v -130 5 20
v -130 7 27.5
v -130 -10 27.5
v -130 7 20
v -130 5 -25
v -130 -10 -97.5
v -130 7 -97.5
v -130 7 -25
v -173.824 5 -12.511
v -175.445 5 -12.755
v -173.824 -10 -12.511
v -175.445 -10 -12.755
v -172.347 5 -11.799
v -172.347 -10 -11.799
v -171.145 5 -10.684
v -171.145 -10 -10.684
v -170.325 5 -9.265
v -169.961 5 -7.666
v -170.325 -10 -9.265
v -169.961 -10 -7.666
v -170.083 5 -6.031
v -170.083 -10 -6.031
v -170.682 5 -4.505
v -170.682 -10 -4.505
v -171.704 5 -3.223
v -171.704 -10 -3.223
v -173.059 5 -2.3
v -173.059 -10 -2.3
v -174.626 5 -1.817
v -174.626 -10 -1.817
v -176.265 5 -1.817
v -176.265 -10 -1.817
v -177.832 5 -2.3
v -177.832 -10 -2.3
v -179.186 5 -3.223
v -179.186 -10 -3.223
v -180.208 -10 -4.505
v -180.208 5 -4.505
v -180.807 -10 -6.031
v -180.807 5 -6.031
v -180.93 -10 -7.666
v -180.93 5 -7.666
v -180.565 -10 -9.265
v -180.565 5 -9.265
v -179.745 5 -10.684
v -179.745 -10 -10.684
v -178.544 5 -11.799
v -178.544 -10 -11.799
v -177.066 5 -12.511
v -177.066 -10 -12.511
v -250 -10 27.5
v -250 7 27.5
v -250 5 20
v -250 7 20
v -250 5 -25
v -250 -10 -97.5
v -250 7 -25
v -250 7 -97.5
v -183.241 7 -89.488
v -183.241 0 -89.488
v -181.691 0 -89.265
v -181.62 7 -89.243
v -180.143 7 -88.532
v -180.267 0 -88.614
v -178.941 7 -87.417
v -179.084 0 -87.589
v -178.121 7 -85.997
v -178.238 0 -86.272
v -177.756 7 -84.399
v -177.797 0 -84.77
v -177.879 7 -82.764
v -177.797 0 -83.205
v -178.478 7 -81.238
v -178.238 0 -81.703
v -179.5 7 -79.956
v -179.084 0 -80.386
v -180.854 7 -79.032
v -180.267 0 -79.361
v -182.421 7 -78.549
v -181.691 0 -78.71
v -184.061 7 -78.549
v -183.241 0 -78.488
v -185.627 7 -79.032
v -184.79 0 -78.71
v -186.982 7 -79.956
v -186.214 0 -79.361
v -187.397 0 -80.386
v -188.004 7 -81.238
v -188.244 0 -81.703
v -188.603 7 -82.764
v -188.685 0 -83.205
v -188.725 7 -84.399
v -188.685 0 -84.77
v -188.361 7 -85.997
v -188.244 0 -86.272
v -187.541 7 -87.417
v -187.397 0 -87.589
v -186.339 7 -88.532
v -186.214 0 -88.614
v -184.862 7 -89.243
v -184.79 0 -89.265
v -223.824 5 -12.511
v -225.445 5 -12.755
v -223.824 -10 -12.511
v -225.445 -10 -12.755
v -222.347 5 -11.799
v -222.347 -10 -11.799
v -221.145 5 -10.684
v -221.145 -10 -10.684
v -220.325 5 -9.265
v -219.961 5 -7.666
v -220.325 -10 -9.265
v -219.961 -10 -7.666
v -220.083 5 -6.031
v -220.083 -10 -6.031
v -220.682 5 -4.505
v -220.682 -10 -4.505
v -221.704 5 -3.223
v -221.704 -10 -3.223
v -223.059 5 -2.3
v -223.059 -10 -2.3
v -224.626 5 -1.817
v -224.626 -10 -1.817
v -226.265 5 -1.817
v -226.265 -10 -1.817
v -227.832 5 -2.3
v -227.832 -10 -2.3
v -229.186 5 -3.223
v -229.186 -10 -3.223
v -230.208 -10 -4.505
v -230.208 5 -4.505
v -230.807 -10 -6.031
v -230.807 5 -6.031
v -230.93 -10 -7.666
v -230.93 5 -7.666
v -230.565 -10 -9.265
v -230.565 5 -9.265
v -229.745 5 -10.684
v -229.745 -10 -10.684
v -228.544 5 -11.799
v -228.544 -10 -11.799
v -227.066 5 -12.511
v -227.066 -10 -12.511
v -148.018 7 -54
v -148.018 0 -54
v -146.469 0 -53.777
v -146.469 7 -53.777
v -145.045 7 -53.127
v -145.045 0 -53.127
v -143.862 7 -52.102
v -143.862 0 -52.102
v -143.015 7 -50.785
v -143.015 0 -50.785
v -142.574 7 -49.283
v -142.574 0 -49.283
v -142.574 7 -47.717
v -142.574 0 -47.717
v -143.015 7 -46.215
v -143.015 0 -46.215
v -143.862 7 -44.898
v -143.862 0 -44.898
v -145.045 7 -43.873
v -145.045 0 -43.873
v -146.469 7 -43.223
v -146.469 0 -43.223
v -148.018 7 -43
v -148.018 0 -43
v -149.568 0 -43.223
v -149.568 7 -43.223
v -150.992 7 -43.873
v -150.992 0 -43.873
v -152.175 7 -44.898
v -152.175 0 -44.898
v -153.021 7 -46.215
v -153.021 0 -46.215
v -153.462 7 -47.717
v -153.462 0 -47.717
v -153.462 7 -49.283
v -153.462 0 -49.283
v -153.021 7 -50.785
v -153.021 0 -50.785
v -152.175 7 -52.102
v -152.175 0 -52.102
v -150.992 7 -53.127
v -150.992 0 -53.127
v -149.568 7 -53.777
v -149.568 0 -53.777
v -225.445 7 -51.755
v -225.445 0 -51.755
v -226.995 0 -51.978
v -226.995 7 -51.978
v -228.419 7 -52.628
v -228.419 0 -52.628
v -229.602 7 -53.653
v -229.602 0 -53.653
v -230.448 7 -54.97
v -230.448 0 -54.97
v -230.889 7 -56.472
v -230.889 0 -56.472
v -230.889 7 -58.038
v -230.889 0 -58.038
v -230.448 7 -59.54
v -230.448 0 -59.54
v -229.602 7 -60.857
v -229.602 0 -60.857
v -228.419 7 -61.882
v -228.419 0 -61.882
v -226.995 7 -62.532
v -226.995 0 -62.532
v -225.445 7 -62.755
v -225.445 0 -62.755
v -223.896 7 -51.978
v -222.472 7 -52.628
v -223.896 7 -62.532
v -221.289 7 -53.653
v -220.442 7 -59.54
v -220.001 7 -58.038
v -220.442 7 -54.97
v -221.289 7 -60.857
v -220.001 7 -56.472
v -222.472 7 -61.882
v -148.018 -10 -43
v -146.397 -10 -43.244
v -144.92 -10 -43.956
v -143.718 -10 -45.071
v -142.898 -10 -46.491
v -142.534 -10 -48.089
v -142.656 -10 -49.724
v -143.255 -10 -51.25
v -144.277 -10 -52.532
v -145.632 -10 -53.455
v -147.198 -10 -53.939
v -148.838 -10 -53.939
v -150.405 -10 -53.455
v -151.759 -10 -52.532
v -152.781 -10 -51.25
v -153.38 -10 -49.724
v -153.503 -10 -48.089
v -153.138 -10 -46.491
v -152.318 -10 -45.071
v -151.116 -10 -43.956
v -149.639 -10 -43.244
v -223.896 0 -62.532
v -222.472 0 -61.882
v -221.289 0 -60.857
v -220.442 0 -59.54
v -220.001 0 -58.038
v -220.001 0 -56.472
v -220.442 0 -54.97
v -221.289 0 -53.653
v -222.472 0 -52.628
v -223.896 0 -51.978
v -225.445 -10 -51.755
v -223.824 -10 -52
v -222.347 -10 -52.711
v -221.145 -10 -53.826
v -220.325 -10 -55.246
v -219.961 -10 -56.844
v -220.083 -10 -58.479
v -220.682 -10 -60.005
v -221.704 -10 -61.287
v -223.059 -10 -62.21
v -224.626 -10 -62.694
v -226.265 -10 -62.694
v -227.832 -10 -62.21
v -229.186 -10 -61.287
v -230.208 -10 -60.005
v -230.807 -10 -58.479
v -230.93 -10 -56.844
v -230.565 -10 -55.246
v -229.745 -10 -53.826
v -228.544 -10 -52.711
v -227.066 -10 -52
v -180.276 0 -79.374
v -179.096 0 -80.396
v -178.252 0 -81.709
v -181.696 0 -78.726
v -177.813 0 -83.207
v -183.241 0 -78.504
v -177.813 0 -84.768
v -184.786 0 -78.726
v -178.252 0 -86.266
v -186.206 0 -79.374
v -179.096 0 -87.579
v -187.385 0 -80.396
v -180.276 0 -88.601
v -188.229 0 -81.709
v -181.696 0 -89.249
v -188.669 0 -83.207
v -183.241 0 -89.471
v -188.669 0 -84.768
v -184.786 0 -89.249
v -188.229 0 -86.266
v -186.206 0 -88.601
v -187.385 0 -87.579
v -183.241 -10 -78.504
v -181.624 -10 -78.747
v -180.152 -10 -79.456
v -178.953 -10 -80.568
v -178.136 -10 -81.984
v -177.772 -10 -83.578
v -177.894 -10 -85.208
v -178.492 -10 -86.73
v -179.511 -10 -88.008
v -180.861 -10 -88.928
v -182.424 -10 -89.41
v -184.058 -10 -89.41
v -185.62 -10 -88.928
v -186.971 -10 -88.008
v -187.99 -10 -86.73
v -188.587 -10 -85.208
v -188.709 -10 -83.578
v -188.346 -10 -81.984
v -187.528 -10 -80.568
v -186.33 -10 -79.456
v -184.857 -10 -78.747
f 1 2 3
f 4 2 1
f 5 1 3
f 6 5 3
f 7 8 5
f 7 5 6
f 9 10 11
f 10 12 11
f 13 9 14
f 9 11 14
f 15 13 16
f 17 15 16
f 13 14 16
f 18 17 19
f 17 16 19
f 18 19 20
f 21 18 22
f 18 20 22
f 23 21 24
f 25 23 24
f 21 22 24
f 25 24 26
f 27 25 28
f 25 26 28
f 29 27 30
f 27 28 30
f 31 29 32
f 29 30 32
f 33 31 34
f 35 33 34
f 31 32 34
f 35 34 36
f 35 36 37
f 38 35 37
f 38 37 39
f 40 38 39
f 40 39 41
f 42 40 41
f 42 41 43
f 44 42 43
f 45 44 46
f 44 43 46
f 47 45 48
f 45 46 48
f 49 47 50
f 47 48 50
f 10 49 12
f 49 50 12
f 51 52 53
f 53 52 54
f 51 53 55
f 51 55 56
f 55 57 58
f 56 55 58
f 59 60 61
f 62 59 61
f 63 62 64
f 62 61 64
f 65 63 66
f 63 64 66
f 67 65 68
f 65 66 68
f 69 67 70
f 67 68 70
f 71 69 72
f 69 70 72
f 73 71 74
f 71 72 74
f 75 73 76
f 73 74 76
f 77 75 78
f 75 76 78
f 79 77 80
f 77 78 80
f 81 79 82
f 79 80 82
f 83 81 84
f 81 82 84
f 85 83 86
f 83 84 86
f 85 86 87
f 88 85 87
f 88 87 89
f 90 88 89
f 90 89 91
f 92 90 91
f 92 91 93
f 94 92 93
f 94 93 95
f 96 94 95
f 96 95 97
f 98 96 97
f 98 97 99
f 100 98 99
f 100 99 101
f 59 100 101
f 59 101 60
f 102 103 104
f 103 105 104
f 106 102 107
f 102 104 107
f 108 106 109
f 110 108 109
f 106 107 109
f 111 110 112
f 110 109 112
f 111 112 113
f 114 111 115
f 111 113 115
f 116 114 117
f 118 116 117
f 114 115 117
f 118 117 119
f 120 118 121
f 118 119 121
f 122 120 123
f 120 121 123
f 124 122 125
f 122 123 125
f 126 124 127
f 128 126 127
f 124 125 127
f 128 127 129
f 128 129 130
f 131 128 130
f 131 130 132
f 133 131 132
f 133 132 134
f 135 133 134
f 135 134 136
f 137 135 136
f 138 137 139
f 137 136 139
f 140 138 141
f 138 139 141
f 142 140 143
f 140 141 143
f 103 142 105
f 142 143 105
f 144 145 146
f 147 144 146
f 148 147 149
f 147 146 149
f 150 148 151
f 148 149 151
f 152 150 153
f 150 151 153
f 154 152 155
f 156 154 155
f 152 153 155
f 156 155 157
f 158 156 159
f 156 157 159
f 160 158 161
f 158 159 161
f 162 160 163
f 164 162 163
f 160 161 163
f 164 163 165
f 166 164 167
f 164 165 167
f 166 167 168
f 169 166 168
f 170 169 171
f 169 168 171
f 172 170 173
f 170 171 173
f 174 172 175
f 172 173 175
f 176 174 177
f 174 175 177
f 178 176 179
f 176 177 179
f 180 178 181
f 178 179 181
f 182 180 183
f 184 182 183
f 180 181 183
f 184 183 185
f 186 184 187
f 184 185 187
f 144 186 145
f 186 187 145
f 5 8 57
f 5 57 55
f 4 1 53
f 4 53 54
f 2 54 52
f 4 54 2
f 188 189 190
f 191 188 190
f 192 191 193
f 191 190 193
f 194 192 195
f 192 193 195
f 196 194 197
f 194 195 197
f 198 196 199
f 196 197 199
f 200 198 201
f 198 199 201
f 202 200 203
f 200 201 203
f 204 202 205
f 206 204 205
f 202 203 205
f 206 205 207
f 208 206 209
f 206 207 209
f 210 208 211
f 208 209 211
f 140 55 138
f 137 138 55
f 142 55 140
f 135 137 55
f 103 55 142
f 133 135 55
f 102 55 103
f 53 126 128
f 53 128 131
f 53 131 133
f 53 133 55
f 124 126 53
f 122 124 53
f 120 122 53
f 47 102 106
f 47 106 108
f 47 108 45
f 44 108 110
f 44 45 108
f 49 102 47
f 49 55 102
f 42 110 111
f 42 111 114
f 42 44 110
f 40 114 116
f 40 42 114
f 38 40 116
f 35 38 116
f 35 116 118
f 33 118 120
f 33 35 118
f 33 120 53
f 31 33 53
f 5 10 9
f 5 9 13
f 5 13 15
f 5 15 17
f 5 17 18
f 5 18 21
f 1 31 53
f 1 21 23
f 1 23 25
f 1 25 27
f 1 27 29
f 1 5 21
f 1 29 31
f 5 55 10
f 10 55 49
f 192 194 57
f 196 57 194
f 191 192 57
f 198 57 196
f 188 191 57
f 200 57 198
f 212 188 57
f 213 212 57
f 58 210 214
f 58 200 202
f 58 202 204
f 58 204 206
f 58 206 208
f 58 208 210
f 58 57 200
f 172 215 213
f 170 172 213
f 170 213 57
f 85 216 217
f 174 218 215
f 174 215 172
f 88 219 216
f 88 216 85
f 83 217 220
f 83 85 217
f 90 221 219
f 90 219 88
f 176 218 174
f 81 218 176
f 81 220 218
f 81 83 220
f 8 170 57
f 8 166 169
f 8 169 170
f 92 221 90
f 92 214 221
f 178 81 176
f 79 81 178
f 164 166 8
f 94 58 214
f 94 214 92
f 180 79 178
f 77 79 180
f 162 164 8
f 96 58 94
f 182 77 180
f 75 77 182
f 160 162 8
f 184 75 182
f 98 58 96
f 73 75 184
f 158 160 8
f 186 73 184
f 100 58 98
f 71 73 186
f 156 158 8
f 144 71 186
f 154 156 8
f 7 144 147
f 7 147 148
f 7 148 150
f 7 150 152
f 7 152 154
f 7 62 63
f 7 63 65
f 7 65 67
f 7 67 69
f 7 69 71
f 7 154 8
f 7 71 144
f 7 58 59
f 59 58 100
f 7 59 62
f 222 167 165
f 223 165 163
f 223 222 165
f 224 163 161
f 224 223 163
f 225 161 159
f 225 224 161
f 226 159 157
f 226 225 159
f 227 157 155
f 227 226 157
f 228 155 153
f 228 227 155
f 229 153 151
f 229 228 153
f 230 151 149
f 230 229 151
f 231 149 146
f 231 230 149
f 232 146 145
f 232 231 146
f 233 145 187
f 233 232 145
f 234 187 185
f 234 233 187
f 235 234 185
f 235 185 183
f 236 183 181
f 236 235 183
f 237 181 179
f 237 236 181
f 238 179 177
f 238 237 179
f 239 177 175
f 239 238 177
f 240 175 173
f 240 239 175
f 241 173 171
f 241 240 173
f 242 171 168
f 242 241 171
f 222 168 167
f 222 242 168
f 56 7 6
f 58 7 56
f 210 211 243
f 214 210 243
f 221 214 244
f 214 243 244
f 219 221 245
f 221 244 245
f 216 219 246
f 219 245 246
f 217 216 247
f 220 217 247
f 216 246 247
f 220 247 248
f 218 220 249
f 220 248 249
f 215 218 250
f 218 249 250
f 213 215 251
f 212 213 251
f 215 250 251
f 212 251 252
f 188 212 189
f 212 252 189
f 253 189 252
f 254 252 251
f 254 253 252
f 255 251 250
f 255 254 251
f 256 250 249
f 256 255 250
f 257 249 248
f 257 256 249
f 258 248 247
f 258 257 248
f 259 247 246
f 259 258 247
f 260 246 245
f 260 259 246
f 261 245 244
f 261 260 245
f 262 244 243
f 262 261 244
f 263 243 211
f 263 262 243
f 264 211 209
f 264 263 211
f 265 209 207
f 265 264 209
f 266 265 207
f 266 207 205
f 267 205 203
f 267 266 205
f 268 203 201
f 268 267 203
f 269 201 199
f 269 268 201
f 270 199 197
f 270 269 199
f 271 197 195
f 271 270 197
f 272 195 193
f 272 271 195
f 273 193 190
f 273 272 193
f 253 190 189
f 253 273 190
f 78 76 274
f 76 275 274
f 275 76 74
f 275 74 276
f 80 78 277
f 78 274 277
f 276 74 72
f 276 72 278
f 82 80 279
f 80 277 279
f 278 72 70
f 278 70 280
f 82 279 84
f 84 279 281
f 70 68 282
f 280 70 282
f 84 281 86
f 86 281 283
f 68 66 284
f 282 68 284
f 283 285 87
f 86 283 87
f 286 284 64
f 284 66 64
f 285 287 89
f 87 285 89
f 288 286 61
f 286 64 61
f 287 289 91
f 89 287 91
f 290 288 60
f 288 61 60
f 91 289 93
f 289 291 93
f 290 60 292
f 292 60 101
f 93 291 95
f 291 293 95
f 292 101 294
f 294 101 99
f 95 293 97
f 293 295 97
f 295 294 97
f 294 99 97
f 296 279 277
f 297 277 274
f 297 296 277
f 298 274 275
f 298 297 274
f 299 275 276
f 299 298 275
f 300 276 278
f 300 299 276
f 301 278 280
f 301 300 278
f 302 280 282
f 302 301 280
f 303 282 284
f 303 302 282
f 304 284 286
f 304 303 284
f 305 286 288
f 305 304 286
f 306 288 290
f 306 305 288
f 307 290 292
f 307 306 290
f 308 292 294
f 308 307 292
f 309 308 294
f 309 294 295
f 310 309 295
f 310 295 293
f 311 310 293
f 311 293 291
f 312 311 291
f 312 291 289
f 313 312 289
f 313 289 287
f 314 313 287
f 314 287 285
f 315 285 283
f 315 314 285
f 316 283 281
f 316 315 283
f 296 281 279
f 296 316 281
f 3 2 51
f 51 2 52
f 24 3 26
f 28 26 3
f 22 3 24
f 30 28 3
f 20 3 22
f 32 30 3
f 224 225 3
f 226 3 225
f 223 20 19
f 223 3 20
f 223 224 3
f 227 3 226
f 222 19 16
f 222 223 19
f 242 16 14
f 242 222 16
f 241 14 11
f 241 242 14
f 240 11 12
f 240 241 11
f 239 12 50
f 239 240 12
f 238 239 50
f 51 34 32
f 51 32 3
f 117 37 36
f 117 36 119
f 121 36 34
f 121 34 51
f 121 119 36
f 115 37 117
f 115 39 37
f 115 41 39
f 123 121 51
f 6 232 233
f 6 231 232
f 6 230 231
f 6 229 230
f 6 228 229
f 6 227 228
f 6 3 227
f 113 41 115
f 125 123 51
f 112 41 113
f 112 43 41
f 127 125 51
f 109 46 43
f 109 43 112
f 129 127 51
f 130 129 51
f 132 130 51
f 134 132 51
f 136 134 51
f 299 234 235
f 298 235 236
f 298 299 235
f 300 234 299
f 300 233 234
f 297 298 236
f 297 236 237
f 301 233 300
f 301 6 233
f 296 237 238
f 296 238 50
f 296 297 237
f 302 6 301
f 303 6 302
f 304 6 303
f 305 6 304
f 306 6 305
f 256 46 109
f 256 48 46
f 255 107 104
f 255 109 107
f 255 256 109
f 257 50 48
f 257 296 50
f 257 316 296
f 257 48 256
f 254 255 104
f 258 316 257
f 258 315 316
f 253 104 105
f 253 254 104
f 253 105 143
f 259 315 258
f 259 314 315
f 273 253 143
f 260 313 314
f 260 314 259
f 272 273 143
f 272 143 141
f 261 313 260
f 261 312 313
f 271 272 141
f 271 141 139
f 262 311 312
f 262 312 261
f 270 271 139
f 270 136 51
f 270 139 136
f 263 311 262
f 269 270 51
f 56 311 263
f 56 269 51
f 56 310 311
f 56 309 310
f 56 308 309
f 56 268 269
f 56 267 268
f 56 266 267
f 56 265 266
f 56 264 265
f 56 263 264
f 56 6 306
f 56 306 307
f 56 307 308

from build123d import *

# Parameters (mm, degrees)
SKETCH1_W           = 120
SKETCH1_H           = 55
BOSS_EXTRUDE1_DEPTH = 5
SKETCH2_W           = 120
SKETCH2_H           = 7.5
BOSS_EXTRUDE2_DEPTH = 20
SKETCH3_W           = 120
SKETCH3_H           = 2.5
BOSS_EXTRUDE4_DEPTH = 20
BOSS_EXTRUDE5_DEPTH = 190
SKETCH9_W           = 310
SKETCH9_H           = 25
BOSS_EXTRUDE6_DEPTH = 70
SKETCH14_R          = 5.5
CUT_EXTRUDE5_DEPTH  = 153
SKETCH15_W          = 125
SKETCH15_H          = 25
CUT_EXTRUDE6_DEPTH  = 190
SKETCH16_W          = 120
SKETCH16_H          = 125
BOSS_EXTRUDE8_DEPTH = 10
SKETCH17_W          = 120
SKETCH17_H          = 125
CUT_EXTRUDE7_DEPTH  = 18
CUT_EXTRUDE8_START  = -18
SKETCH18_R          = 5.5
CUT_EXTRUDE8_DEPTH  = 18
CUT_EXTRUDE9_START  = -47
SKETCH20_R          = 5.483938487
SKETCH20_R_2        = 5.5
CUT_EXTRUDE9_DEPTH  = 47
CUT_EXTRUDE10_START = -47
SKETCH21_R          = 5.5
CUT_EXTRUDE10_DEPTH = 47
CUT_EXTRUDE11_START = -47
SKETCH22_R          = 5.5
CUT_EXTRUDE11_DEPTH = 47


with BuildPart() as part:
    # Sketch1 → Boss-Extrude1 (new body)
    with BuildSketch(Plane(origin=(0, 0, 0), x_dir=(1, 0, 0), z_dir=(0, 1, 0))):
        Rectangle(SKETCH1_W, SKETCH1_H)
    extrude(amount=BOSS_EXTRUDE1_DEPTH)

    # Sketch2 → Boss-Extrude2 (add)
    with BuildSketch(Plane(origin=(0, 5, 0), x_dir=(1, 0, 0), z_dir=(0, 1, 0))):
        with Locations((0, -23.75)):
            Rectangle(SKETCH2_W, SKETCH2_H)
    extrude(amount=BOSS_EXTRUDE2_DEPTH)

    # Sketch3 → Boss-Extrude4 (add)
    with BuildSketch(Plane(origin=(0, 5, 0), x_dir=(1, 0, 0), z_dir=(0, 1, 0))):
        with Locations((0, 26.25)):
            Rectangle(SKETCH3_W, SKETCH3_H)
    extrude(amount=BOSS_EXTRUDE4_DEPTH)

    # Sketch8 → Boss-Extrude5 (add)
    with BuildSketch(Plane.ZY.offset(60)):
        Polygon((-27.5, 0), (-27.5, 25), (-25, 25), (-25, 5), (20, 5), (20, 25), (27.5, 25), (27.5, 0), align=None)
    extrude(amount=BOSS_EXTRUDE5_DEPTH)

    # Sketch9 → Boss-Extrude6 (add)
    with BuildSketch(Plane(origin=(0, 0, -27.5), x_dir=(-1, 0, 0), z_dir=(0, 0, -1))):
        with Locations((95, 12.5)):
            Rectangle(SKETCH9_W, SKETCH9_H)
    extrude(amount=BOSS_EXTRUDE6_DEPTH)

    # Sketch14 → Cut-Extrude5 (cut)
    with BuildSketch(Plane(origin=(0, 0, 0), x_dir=(-1, 0, 0), z_dir=(0, -1, 0))):
        with Locations(Location((225.445279058, 7.255161462, 0), (0, 0, 90))):
            Circle(SKETCH14_R)
        with Locations(Location((175.445279058, 7.255161462, 0), (0, 0, 90))):
            Circle(SKETCH14_R)
        with Locations(Location((225.445279058, 57.255161462, 0), (0, 0, 90))):
            Circle(SKETCH14_R)
        with Locations(Location((148.0182107, 48.5, 0), (0, 0, 90))):
            Circle(SKETCH14_R)
        with Locations(Location((183.240850763, 83.987541856, 0), (0, 0, 90))):
            Circle(SKETCH14_R)
    extrude(amount=-CUT_EXTRUDE5_DEPTH, mode=Mode.SUBTRACT)

    # Sketch15 → Cut-Extrude6 (cut)
    with BuildSketch(Plane(origin=(60, 0, 0), x_dir=(0, 0, -1), z_dir=(1, 0, 0))):
        with Locations((35, 12.5)):
            Rectangle(SKETCH15_W, SKETCH15_H)
    extrude(amount=-CUT_EXTRUDE6_DEPTH, mode=Mode.SUBTRACT)

    # Sketch16 → Boss-Extrude8 (add)
    with BuildSketch(Plane(origin=(0, 0, 0), x_dir=(-1, 0, 0), z_dir=(0, -1, 0))):
        with Locations((190, 35)):
            Rectangle(SKETCH16_W, SKETCH16_H)
    extrude(amount=BOSS_EXTRUDE8_DEPTH)

    # Sketch17 → Cut-Extrude7 (cut)
    with BuildSketch(Plane(origin=(0, 25, 0), x_dir=(1, 0, 0), z_dir=(0, 1, 0))):
        with Locations((-190, 35)):
            Rectangle(SKETCH17_W, SKETCH17_H)
    extrude(amount=-CUT_EXTRUDE7_DEPTH, mode=Mode.SUBTRACT)

    # Sketch18 → Cut-Extrude8 (cut)
    with BuildSketch(Plane(origin=(0, 7, 0), x_dir=(1, 0, 0), z_dir=(0, 1, 0)).offset(CUT_EXTRUDE8_START)):
        with Locations(Location((-148.0182107, 48.5, 0), (0, 0, 270))):
            Circle(SKETCH18_R)
    extrude(amount=CUT_EXTRUDE8_DEPTH, mode=Mode.SUBTRACT)

    # Sketch20 → Cut-Extrude9 (cut)
    with BuildSketch(Plane(origin=(0, 7, 0), x_dir=(1, 0, 0), z_dir=(0, 1, 0)).offset(CUT_EXTRUDE9_START)):
        with Locations(Location((-183.240850763, 83.987541856, 0), (0, 0, 270))):
            Circle(SKETCH20_R)
        with Locations(Location((-225.445279058, 57.255161462, 0), (0, 0, 270))):
            Circle(SKETCH20_R_2)
    extrude(amount=CUT_EXTRUDE9_DEPTH, mode=Mode.SUBTRACT)

    # Sketch21 → Cut-Extrude10 (cut)
    with BuildSketch(Plane(origin=(0, 5, 0), x_dir=(1, 0, 0), z_dir=(0, 1, 0)).offset(CUT_EXTRUDE10_START)):
        with Locations(Location((-225.445279058, 7.255161462, 0), (0, 0, 90))):
            Circle(SKETCH21_R)
    extrude(amount=CUT_EXTRUDE10_DEPTH, mode=Mode.SUBTRACT)

    # Sketch22 → Cut-Extrude11 (cut)
    with BuildSketch(Plane(origin=(0, 5, 0), x_dir=(1, 0, 0), z_dir=(0, 1, 0)).offset(CUT_EXTRUDE11_START)):
        with Locations(Location((-175.445279058, 7.255161462, 0), (0, 0, 90))):
            Circle(SKETCH22_R)
    extrude(amount=CUT_EXTRUDE11_DEPTH, mode=Mode.SUBTRACT)


solid = part.part
